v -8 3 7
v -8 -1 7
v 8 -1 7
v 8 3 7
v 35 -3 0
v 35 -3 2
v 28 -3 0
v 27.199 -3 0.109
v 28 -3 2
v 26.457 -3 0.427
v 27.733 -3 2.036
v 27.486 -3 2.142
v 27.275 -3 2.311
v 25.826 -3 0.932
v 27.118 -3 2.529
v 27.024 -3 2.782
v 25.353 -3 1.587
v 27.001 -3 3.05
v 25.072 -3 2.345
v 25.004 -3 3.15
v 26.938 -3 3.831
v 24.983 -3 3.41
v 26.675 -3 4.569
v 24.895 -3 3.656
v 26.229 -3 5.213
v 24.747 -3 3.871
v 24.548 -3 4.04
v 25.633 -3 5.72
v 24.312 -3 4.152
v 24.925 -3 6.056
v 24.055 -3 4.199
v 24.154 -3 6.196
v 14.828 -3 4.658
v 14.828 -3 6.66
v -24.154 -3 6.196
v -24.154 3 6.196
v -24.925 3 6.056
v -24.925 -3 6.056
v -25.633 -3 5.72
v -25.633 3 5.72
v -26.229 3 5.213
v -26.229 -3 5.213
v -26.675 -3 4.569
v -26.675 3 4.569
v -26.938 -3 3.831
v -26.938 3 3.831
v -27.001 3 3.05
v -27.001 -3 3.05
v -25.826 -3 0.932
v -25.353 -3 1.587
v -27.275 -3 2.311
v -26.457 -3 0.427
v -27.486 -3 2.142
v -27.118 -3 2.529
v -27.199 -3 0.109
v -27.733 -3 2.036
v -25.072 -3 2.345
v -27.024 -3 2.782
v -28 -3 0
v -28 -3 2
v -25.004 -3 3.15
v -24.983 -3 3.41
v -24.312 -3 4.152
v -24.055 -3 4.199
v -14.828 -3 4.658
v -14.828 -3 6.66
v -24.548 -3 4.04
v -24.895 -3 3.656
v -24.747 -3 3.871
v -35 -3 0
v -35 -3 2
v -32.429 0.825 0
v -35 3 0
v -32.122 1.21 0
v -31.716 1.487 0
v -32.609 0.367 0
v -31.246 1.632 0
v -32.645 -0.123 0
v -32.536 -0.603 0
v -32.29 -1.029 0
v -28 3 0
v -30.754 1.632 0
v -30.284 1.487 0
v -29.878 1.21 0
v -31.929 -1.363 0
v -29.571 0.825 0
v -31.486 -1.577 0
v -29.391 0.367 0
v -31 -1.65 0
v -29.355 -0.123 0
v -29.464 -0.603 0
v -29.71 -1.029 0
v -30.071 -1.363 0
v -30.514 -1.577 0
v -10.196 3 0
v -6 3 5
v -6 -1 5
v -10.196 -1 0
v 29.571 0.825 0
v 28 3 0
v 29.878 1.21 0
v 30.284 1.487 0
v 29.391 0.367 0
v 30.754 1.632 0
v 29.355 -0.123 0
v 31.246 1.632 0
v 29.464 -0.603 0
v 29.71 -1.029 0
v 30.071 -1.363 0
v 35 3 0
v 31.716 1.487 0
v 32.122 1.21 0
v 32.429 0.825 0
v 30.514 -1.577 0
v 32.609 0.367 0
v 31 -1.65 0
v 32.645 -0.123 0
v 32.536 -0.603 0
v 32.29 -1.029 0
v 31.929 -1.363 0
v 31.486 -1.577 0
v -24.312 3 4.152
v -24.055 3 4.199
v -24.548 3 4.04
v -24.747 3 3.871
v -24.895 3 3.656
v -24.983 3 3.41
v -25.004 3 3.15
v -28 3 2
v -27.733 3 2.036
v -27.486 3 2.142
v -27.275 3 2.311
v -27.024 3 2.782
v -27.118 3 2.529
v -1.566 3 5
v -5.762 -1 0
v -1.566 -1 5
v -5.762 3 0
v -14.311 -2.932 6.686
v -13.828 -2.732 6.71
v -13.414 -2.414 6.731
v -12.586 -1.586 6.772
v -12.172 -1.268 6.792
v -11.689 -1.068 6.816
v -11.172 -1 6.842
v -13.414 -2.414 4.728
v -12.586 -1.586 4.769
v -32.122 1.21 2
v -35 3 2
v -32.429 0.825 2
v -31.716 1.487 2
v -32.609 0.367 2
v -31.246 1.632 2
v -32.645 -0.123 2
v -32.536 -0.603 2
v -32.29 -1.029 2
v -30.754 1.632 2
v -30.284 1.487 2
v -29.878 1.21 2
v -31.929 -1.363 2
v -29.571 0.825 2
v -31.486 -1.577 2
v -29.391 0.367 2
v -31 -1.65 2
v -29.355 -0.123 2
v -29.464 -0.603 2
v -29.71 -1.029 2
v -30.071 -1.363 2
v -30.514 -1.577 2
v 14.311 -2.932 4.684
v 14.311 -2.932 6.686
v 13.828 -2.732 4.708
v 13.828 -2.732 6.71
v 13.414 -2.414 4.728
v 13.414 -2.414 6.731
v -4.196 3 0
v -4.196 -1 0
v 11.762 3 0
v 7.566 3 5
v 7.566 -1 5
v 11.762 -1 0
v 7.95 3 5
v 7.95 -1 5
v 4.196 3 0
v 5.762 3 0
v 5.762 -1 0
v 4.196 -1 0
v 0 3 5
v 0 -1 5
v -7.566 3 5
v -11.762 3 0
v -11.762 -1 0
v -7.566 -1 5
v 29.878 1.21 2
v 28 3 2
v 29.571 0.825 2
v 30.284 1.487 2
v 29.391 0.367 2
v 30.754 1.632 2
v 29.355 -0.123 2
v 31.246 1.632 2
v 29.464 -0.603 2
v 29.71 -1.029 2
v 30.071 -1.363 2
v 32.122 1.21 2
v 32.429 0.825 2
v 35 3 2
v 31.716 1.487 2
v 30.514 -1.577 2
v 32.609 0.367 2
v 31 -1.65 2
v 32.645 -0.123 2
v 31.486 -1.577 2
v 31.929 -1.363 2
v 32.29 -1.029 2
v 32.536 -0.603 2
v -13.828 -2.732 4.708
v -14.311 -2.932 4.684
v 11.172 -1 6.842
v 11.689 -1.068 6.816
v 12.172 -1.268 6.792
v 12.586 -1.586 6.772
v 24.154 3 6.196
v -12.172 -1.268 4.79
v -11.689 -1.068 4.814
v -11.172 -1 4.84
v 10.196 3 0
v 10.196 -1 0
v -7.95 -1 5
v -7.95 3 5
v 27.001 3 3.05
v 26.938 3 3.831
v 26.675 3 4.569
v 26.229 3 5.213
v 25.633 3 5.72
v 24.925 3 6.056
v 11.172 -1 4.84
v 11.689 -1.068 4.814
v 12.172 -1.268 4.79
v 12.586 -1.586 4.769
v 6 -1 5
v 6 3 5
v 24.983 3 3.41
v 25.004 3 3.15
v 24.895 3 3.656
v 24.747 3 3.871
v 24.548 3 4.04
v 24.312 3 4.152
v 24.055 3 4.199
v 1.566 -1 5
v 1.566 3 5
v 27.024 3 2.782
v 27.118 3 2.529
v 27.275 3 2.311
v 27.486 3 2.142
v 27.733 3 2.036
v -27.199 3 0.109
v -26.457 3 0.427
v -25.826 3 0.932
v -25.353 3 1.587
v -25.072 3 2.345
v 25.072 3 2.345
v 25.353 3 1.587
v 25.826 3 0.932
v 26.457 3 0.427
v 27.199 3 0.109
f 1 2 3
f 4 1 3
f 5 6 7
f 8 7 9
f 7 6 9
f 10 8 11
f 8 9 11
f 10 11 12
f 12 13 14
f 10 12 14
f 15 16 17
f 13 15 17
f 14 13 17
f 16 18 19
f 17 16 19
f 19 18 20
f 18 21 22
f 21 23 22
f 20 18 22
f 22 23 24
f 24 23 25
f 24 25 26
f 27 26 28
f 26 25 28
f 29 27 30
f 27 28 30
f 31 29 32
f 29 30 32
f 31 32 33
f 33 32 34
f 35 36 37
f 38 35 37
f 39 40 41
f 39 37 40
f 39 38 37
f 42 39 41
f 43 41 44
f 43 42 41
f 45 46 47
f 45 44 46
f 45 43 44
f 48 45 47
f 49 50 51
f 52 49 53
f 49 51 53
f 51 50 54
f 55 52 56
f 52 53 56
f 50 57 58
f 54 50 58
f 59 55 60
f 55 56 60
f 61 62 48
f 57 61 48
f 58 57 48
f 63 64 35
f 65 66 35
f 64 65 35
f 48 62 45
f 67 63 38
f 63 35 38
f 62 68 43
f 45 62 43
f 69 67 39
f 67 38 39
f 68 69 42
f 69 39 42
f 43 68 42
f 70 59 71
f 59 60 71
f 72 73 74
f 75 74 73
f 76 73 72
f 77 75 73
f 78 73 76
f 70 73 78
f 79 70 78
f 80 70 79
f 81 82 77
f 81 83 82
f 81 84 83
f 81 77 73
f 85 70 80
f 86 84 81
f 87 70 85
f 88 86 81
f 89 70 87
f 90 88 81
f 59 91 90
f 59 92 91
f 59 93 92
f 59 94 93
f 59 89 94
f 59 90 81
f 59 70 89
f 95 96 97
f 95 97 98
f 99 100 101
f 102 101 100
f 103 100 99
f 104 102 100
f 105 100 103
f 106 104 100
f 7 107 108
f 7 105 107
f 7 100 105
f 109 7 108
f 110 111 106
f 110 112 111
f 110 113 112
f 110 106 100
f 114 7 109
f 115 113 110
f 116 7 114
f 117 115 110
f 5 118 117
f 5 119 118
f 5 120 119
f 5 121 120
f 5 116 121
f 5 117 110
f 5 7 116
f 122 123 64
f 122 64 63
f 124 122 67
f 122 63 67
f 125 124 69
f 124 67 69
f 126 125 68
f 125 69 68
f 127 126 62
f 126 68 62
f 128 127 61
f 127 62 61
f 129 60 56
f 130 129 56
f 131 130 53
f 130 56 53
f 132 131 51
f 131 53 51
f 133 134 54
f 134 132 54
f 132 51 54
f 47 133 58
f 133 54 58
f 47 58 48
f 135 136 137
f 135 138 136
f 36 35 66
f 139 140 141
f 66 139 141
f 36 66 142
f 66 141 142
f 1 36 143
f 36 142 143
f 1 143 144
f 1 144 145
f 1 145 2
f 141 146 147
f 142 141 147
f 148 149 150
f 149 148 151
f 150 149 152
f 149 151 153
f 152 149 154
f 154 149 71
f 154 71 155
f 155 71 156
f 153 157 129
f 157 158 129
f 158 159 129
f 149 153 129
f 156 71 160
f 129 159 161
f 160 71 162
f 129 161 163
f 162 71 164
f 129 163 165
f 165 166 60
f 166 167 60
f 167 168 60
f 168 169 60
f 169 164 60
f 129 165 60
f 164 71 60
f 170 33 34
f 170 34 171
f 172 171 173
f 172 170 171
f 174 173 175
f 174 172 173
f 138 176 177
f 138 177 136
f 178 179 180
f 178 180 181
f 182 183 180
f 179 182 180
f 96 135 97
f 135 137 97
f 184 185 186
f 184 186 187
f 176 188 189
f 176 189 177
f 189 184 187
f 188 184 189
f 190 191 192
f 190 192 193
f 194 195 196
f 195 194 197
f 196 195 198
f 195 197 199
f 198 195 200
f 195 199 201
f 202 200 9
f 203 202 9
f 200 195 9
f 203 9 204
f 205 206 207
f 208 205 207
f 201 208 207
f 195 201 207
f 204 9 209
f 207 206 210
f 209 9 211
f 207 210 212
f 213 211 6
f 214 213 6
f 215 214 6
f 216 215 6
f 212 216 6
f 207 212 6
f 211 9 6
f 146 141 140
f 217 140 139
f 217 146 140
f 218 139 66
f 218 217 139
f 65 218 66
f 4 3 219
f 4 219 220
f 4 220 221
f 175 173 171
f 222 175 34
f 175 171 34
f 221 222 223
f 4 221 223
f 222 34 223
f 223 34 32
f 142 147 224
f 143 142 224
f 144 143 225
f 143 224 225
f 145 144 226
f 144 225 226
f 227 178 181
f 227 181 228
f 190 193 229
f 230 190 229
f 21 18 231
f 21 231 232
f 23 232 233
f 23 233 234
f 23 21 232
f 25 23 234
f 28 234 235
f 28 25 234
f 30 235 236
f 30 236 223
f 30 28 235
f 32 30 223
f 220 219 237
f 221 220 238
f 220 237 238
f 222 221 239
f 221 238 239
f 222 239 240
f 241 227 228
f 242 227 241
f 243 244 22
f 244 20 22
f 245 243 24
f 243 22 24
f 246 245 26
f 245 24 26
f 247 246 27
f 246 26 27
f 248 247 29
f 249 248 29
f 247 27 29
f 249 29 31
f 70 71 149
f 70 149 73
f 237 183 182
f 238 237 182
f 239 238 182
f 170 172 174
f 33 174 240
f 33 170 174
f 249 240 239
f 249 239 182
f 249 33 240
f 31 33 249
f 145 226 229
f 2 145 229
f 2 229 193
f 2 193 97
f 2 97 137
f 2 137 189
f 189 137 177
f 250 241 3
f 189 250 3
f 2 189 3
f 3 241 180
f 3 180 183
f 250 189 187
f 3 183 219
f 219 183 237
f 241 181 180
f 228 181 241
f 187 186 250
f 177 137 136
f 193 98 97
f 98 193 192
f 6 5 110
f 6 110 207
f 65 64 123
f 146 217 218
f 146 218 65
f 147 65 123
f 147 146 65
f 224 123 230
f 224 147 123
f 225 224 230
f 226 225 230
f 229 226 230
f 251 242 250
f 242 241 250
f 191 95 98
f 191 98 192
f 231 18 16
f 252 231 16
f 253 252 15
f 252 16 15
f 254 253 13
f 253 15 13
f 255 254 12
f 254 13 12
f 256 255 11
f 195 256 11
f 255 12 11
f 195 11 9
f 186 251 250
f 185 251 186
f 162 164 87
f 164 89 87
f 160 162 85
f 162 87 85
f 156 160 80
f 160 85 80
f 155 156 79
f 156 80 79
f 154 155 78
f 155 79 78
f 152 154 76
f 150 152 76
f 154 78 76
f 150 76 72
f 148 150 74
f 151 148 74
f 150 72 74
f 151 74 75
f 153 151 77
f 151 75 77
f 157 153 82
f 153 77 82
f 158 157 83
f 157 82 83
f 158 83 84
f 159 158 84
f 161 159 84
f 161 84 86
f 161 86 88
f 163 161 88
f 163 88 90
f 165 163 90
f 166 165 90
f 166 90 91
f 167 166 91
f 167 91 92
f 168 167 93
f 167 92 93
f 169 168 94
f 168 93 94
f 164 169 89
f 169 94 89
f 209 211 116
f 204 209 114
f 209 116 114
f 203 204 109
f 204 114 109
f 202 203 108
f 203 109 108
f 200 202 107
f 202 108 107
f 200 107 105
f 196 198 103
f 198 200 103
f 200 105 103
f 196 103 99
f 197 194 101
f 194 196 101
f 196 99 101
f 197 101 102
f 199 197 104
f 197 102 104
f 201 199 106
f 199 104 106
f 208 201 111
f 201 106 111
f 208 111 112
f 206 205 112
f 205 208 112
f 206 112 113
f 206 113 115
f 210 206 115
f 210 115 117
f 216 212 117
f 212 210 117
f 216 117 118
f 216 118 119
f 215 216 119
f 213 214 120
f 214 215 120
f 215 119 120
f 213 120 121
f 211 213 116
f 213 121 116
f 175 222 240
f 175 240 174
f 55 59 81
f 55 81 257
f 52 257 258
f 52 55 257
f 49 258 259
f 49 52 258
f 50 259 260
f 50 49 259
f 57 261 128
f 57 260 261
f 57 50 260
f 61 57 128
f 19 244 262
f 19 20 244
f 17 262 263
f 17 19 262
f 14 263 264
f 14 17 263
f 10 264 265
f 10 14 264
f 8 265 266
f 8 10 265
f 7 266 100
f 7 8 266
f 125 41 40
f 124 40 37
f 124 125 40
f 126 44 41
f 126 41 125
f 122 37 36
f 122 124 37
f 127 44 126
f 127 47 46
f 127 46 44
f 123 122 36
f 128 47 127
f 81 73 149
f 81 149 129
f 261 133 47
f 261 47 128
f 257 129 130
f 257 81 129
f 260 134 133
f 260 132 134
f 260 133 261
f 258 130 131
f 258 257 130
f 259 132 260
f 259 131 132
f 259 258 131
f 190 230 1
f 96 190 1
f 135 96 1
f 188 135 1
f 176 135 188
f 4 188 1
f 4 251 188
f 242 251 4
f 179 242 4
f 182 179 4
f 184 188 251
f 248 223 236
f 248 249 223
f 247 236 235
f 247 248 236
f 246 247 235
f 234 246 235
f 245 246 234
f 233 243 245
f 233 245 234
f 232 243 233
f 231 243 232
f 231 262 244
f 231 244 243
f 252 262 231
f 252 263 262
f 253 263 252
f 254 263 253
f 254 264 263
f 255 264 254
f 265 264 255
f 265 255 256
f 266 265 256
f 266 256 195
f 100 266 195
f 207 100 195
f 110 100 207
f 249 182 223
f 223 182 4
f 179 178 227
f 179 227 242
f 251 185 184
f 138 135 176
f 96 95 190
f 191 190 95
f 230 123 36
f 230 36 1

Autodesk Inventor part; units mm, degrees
ref_plane "YZ Plane" through (0, 0, 0) normal (1, 0, 0) x (0, 1, 0)
ref_plane "XZ Plane" through (0, 0, 0) normal (0, 1, 0) x (-1, 0, 0)
ref_plane "XY Plane" through (0, 0, 0) normal (0, 0, 1) x (1, 0, 0)
sketch "Skizze1" plane through (0, 0, 0) normal (0, 1, 0) x (-1, 0, 0)
  line L0 (35, 2) -> (28, 2)
  line L1 (35, 2) -> (35, 0)
  line L2 (35, 0) -> (28, 0)
  line L3 (24.1541, 6.1963) -> (8, 7)
  line L4 (24.0547, 4.1988) -> (7.9503, 5)
  line L5 (31, 2) -> (31, 0) construction
  line L6 (8, 7) -> (0, 7)
  line L7 (0, 7) -> (0, 5)
  line L8 (0, 5) -> (7.9503, 5)
  arc A0 (27.0013, 3.05) -> (28, 2) centre (28, 3) ccw
  arc A1 (25.0038, 3.15) -> (28, 0) centre (28, 3) ccw
  arc A2 (25.0038, 3.15) -> (24.0547, 4.1988) centre (24.005, 3.2) ccw
  arc A3 (27.0013, 3.05) -> (24.1541, 6.1963) centre (24.005, 3.2) ccw
  point P0 (0, 0)
  dimension "d0" = 2
  dimension "d1" = 31
  dimension "d2" = 4
  dimension "d5" = 7
  dimension "d6" = 8
  dimension "d7" = 2
  dimension "d8" = 2
  dimension "d26" = 1
  dimension "d27" = 3
  dimension "d28" = 1
  dimension "d29" = 0.2
extrude "Extrusion1" add sketch "Skizze1" along normal mid plane 6
sketch "Skizze2" plane through (-35, 3, 2) normal (0, 0, 1) x (1, 0, 0)
  line L0 (0, 0) -> (7, 0) projected
  line L1 (0, -6) -> (0, 0) projected
  line L2 (7, -6) -> (0, -6) projected
  line L3 (7, -6) -> (7, 0) projected
  line L4 (35, -7.2) -> (35, 1.2) projected
  line L5 (-7, -3) -> (42, -3) projected
  point P0 (35, -3)
  point P1 (4, -3)
  dimension "d30" = 31
hole "Bohrung1" at (-31, 0, 2) direction (0, 0, -1) diameter 3.3 end through all
sketch "Skizze3" plane through (0, 3, 0) normal (0, 1, 0) x (1, 0, 0)
  line L0 (0, -5) -> (-7.9503, -5) projected
  line L1 (-0.0196, -5.3946) -> (-28.1986, -3.9926) projected
  line L2 (0, -5) -> (-4.1955, 0)
  line L3 (-4.1955, 0) -> (-5.762, 0)
  line L4 (-5.762, 0) -> (-1.5665, -5)
  line L5 (0, 1.4) -> (0, -8.4) construction
  point P0 (0, 0)
  point P1 (-28, 0)
  dimension "d19" = 40
  dimension "d20" = 1.2
extrude "Extrusion2" add sketch "Skizze3" against normal blind 4
pattern_linear "Rechteckige Anordnung1" count 2 spacing 6 along (-1, 0, 0) of "Extrusion2"
mirror "Spiegeln1" about plane through (0, 0, 0) normal (1, 0, 0) of "Extrusion1", "Bohrung1", "Extrusion2", "Rechteckige Anordnung1"
sketch "Skizze4" plane through (-8, -3, 7) normal (0, 0, 1) x (1, 0, 0)
  line L0 (8, 7.2) -> (8, -1.2) construction
  line L1 (0, 0) -> (16, 0) construction
  line L2 (-6, 0) -> (-4, 2)
  line L3 (-4, 2) -> (20, 2)
  line L4 (20, 2) -> (22, 0)
  line L5 (22, 0) -> (-6, 0)
  point P0 (8, 3)
  dimension "d31" = 2
  dimension "d32" = 24
  dimension "d33" = 45
extrude "Extrusion3" cut sketch "Skizze4" against normal through all
fillet "Rundung1" radius 2 4 edges at (-14, -3, 5.7002) (-12, -1, 5.7998) (12, -1, 5.7998) (14, -3, 5.7002)
properties part number "Dribbler Daempfer Oben" material "PVC, hart"
